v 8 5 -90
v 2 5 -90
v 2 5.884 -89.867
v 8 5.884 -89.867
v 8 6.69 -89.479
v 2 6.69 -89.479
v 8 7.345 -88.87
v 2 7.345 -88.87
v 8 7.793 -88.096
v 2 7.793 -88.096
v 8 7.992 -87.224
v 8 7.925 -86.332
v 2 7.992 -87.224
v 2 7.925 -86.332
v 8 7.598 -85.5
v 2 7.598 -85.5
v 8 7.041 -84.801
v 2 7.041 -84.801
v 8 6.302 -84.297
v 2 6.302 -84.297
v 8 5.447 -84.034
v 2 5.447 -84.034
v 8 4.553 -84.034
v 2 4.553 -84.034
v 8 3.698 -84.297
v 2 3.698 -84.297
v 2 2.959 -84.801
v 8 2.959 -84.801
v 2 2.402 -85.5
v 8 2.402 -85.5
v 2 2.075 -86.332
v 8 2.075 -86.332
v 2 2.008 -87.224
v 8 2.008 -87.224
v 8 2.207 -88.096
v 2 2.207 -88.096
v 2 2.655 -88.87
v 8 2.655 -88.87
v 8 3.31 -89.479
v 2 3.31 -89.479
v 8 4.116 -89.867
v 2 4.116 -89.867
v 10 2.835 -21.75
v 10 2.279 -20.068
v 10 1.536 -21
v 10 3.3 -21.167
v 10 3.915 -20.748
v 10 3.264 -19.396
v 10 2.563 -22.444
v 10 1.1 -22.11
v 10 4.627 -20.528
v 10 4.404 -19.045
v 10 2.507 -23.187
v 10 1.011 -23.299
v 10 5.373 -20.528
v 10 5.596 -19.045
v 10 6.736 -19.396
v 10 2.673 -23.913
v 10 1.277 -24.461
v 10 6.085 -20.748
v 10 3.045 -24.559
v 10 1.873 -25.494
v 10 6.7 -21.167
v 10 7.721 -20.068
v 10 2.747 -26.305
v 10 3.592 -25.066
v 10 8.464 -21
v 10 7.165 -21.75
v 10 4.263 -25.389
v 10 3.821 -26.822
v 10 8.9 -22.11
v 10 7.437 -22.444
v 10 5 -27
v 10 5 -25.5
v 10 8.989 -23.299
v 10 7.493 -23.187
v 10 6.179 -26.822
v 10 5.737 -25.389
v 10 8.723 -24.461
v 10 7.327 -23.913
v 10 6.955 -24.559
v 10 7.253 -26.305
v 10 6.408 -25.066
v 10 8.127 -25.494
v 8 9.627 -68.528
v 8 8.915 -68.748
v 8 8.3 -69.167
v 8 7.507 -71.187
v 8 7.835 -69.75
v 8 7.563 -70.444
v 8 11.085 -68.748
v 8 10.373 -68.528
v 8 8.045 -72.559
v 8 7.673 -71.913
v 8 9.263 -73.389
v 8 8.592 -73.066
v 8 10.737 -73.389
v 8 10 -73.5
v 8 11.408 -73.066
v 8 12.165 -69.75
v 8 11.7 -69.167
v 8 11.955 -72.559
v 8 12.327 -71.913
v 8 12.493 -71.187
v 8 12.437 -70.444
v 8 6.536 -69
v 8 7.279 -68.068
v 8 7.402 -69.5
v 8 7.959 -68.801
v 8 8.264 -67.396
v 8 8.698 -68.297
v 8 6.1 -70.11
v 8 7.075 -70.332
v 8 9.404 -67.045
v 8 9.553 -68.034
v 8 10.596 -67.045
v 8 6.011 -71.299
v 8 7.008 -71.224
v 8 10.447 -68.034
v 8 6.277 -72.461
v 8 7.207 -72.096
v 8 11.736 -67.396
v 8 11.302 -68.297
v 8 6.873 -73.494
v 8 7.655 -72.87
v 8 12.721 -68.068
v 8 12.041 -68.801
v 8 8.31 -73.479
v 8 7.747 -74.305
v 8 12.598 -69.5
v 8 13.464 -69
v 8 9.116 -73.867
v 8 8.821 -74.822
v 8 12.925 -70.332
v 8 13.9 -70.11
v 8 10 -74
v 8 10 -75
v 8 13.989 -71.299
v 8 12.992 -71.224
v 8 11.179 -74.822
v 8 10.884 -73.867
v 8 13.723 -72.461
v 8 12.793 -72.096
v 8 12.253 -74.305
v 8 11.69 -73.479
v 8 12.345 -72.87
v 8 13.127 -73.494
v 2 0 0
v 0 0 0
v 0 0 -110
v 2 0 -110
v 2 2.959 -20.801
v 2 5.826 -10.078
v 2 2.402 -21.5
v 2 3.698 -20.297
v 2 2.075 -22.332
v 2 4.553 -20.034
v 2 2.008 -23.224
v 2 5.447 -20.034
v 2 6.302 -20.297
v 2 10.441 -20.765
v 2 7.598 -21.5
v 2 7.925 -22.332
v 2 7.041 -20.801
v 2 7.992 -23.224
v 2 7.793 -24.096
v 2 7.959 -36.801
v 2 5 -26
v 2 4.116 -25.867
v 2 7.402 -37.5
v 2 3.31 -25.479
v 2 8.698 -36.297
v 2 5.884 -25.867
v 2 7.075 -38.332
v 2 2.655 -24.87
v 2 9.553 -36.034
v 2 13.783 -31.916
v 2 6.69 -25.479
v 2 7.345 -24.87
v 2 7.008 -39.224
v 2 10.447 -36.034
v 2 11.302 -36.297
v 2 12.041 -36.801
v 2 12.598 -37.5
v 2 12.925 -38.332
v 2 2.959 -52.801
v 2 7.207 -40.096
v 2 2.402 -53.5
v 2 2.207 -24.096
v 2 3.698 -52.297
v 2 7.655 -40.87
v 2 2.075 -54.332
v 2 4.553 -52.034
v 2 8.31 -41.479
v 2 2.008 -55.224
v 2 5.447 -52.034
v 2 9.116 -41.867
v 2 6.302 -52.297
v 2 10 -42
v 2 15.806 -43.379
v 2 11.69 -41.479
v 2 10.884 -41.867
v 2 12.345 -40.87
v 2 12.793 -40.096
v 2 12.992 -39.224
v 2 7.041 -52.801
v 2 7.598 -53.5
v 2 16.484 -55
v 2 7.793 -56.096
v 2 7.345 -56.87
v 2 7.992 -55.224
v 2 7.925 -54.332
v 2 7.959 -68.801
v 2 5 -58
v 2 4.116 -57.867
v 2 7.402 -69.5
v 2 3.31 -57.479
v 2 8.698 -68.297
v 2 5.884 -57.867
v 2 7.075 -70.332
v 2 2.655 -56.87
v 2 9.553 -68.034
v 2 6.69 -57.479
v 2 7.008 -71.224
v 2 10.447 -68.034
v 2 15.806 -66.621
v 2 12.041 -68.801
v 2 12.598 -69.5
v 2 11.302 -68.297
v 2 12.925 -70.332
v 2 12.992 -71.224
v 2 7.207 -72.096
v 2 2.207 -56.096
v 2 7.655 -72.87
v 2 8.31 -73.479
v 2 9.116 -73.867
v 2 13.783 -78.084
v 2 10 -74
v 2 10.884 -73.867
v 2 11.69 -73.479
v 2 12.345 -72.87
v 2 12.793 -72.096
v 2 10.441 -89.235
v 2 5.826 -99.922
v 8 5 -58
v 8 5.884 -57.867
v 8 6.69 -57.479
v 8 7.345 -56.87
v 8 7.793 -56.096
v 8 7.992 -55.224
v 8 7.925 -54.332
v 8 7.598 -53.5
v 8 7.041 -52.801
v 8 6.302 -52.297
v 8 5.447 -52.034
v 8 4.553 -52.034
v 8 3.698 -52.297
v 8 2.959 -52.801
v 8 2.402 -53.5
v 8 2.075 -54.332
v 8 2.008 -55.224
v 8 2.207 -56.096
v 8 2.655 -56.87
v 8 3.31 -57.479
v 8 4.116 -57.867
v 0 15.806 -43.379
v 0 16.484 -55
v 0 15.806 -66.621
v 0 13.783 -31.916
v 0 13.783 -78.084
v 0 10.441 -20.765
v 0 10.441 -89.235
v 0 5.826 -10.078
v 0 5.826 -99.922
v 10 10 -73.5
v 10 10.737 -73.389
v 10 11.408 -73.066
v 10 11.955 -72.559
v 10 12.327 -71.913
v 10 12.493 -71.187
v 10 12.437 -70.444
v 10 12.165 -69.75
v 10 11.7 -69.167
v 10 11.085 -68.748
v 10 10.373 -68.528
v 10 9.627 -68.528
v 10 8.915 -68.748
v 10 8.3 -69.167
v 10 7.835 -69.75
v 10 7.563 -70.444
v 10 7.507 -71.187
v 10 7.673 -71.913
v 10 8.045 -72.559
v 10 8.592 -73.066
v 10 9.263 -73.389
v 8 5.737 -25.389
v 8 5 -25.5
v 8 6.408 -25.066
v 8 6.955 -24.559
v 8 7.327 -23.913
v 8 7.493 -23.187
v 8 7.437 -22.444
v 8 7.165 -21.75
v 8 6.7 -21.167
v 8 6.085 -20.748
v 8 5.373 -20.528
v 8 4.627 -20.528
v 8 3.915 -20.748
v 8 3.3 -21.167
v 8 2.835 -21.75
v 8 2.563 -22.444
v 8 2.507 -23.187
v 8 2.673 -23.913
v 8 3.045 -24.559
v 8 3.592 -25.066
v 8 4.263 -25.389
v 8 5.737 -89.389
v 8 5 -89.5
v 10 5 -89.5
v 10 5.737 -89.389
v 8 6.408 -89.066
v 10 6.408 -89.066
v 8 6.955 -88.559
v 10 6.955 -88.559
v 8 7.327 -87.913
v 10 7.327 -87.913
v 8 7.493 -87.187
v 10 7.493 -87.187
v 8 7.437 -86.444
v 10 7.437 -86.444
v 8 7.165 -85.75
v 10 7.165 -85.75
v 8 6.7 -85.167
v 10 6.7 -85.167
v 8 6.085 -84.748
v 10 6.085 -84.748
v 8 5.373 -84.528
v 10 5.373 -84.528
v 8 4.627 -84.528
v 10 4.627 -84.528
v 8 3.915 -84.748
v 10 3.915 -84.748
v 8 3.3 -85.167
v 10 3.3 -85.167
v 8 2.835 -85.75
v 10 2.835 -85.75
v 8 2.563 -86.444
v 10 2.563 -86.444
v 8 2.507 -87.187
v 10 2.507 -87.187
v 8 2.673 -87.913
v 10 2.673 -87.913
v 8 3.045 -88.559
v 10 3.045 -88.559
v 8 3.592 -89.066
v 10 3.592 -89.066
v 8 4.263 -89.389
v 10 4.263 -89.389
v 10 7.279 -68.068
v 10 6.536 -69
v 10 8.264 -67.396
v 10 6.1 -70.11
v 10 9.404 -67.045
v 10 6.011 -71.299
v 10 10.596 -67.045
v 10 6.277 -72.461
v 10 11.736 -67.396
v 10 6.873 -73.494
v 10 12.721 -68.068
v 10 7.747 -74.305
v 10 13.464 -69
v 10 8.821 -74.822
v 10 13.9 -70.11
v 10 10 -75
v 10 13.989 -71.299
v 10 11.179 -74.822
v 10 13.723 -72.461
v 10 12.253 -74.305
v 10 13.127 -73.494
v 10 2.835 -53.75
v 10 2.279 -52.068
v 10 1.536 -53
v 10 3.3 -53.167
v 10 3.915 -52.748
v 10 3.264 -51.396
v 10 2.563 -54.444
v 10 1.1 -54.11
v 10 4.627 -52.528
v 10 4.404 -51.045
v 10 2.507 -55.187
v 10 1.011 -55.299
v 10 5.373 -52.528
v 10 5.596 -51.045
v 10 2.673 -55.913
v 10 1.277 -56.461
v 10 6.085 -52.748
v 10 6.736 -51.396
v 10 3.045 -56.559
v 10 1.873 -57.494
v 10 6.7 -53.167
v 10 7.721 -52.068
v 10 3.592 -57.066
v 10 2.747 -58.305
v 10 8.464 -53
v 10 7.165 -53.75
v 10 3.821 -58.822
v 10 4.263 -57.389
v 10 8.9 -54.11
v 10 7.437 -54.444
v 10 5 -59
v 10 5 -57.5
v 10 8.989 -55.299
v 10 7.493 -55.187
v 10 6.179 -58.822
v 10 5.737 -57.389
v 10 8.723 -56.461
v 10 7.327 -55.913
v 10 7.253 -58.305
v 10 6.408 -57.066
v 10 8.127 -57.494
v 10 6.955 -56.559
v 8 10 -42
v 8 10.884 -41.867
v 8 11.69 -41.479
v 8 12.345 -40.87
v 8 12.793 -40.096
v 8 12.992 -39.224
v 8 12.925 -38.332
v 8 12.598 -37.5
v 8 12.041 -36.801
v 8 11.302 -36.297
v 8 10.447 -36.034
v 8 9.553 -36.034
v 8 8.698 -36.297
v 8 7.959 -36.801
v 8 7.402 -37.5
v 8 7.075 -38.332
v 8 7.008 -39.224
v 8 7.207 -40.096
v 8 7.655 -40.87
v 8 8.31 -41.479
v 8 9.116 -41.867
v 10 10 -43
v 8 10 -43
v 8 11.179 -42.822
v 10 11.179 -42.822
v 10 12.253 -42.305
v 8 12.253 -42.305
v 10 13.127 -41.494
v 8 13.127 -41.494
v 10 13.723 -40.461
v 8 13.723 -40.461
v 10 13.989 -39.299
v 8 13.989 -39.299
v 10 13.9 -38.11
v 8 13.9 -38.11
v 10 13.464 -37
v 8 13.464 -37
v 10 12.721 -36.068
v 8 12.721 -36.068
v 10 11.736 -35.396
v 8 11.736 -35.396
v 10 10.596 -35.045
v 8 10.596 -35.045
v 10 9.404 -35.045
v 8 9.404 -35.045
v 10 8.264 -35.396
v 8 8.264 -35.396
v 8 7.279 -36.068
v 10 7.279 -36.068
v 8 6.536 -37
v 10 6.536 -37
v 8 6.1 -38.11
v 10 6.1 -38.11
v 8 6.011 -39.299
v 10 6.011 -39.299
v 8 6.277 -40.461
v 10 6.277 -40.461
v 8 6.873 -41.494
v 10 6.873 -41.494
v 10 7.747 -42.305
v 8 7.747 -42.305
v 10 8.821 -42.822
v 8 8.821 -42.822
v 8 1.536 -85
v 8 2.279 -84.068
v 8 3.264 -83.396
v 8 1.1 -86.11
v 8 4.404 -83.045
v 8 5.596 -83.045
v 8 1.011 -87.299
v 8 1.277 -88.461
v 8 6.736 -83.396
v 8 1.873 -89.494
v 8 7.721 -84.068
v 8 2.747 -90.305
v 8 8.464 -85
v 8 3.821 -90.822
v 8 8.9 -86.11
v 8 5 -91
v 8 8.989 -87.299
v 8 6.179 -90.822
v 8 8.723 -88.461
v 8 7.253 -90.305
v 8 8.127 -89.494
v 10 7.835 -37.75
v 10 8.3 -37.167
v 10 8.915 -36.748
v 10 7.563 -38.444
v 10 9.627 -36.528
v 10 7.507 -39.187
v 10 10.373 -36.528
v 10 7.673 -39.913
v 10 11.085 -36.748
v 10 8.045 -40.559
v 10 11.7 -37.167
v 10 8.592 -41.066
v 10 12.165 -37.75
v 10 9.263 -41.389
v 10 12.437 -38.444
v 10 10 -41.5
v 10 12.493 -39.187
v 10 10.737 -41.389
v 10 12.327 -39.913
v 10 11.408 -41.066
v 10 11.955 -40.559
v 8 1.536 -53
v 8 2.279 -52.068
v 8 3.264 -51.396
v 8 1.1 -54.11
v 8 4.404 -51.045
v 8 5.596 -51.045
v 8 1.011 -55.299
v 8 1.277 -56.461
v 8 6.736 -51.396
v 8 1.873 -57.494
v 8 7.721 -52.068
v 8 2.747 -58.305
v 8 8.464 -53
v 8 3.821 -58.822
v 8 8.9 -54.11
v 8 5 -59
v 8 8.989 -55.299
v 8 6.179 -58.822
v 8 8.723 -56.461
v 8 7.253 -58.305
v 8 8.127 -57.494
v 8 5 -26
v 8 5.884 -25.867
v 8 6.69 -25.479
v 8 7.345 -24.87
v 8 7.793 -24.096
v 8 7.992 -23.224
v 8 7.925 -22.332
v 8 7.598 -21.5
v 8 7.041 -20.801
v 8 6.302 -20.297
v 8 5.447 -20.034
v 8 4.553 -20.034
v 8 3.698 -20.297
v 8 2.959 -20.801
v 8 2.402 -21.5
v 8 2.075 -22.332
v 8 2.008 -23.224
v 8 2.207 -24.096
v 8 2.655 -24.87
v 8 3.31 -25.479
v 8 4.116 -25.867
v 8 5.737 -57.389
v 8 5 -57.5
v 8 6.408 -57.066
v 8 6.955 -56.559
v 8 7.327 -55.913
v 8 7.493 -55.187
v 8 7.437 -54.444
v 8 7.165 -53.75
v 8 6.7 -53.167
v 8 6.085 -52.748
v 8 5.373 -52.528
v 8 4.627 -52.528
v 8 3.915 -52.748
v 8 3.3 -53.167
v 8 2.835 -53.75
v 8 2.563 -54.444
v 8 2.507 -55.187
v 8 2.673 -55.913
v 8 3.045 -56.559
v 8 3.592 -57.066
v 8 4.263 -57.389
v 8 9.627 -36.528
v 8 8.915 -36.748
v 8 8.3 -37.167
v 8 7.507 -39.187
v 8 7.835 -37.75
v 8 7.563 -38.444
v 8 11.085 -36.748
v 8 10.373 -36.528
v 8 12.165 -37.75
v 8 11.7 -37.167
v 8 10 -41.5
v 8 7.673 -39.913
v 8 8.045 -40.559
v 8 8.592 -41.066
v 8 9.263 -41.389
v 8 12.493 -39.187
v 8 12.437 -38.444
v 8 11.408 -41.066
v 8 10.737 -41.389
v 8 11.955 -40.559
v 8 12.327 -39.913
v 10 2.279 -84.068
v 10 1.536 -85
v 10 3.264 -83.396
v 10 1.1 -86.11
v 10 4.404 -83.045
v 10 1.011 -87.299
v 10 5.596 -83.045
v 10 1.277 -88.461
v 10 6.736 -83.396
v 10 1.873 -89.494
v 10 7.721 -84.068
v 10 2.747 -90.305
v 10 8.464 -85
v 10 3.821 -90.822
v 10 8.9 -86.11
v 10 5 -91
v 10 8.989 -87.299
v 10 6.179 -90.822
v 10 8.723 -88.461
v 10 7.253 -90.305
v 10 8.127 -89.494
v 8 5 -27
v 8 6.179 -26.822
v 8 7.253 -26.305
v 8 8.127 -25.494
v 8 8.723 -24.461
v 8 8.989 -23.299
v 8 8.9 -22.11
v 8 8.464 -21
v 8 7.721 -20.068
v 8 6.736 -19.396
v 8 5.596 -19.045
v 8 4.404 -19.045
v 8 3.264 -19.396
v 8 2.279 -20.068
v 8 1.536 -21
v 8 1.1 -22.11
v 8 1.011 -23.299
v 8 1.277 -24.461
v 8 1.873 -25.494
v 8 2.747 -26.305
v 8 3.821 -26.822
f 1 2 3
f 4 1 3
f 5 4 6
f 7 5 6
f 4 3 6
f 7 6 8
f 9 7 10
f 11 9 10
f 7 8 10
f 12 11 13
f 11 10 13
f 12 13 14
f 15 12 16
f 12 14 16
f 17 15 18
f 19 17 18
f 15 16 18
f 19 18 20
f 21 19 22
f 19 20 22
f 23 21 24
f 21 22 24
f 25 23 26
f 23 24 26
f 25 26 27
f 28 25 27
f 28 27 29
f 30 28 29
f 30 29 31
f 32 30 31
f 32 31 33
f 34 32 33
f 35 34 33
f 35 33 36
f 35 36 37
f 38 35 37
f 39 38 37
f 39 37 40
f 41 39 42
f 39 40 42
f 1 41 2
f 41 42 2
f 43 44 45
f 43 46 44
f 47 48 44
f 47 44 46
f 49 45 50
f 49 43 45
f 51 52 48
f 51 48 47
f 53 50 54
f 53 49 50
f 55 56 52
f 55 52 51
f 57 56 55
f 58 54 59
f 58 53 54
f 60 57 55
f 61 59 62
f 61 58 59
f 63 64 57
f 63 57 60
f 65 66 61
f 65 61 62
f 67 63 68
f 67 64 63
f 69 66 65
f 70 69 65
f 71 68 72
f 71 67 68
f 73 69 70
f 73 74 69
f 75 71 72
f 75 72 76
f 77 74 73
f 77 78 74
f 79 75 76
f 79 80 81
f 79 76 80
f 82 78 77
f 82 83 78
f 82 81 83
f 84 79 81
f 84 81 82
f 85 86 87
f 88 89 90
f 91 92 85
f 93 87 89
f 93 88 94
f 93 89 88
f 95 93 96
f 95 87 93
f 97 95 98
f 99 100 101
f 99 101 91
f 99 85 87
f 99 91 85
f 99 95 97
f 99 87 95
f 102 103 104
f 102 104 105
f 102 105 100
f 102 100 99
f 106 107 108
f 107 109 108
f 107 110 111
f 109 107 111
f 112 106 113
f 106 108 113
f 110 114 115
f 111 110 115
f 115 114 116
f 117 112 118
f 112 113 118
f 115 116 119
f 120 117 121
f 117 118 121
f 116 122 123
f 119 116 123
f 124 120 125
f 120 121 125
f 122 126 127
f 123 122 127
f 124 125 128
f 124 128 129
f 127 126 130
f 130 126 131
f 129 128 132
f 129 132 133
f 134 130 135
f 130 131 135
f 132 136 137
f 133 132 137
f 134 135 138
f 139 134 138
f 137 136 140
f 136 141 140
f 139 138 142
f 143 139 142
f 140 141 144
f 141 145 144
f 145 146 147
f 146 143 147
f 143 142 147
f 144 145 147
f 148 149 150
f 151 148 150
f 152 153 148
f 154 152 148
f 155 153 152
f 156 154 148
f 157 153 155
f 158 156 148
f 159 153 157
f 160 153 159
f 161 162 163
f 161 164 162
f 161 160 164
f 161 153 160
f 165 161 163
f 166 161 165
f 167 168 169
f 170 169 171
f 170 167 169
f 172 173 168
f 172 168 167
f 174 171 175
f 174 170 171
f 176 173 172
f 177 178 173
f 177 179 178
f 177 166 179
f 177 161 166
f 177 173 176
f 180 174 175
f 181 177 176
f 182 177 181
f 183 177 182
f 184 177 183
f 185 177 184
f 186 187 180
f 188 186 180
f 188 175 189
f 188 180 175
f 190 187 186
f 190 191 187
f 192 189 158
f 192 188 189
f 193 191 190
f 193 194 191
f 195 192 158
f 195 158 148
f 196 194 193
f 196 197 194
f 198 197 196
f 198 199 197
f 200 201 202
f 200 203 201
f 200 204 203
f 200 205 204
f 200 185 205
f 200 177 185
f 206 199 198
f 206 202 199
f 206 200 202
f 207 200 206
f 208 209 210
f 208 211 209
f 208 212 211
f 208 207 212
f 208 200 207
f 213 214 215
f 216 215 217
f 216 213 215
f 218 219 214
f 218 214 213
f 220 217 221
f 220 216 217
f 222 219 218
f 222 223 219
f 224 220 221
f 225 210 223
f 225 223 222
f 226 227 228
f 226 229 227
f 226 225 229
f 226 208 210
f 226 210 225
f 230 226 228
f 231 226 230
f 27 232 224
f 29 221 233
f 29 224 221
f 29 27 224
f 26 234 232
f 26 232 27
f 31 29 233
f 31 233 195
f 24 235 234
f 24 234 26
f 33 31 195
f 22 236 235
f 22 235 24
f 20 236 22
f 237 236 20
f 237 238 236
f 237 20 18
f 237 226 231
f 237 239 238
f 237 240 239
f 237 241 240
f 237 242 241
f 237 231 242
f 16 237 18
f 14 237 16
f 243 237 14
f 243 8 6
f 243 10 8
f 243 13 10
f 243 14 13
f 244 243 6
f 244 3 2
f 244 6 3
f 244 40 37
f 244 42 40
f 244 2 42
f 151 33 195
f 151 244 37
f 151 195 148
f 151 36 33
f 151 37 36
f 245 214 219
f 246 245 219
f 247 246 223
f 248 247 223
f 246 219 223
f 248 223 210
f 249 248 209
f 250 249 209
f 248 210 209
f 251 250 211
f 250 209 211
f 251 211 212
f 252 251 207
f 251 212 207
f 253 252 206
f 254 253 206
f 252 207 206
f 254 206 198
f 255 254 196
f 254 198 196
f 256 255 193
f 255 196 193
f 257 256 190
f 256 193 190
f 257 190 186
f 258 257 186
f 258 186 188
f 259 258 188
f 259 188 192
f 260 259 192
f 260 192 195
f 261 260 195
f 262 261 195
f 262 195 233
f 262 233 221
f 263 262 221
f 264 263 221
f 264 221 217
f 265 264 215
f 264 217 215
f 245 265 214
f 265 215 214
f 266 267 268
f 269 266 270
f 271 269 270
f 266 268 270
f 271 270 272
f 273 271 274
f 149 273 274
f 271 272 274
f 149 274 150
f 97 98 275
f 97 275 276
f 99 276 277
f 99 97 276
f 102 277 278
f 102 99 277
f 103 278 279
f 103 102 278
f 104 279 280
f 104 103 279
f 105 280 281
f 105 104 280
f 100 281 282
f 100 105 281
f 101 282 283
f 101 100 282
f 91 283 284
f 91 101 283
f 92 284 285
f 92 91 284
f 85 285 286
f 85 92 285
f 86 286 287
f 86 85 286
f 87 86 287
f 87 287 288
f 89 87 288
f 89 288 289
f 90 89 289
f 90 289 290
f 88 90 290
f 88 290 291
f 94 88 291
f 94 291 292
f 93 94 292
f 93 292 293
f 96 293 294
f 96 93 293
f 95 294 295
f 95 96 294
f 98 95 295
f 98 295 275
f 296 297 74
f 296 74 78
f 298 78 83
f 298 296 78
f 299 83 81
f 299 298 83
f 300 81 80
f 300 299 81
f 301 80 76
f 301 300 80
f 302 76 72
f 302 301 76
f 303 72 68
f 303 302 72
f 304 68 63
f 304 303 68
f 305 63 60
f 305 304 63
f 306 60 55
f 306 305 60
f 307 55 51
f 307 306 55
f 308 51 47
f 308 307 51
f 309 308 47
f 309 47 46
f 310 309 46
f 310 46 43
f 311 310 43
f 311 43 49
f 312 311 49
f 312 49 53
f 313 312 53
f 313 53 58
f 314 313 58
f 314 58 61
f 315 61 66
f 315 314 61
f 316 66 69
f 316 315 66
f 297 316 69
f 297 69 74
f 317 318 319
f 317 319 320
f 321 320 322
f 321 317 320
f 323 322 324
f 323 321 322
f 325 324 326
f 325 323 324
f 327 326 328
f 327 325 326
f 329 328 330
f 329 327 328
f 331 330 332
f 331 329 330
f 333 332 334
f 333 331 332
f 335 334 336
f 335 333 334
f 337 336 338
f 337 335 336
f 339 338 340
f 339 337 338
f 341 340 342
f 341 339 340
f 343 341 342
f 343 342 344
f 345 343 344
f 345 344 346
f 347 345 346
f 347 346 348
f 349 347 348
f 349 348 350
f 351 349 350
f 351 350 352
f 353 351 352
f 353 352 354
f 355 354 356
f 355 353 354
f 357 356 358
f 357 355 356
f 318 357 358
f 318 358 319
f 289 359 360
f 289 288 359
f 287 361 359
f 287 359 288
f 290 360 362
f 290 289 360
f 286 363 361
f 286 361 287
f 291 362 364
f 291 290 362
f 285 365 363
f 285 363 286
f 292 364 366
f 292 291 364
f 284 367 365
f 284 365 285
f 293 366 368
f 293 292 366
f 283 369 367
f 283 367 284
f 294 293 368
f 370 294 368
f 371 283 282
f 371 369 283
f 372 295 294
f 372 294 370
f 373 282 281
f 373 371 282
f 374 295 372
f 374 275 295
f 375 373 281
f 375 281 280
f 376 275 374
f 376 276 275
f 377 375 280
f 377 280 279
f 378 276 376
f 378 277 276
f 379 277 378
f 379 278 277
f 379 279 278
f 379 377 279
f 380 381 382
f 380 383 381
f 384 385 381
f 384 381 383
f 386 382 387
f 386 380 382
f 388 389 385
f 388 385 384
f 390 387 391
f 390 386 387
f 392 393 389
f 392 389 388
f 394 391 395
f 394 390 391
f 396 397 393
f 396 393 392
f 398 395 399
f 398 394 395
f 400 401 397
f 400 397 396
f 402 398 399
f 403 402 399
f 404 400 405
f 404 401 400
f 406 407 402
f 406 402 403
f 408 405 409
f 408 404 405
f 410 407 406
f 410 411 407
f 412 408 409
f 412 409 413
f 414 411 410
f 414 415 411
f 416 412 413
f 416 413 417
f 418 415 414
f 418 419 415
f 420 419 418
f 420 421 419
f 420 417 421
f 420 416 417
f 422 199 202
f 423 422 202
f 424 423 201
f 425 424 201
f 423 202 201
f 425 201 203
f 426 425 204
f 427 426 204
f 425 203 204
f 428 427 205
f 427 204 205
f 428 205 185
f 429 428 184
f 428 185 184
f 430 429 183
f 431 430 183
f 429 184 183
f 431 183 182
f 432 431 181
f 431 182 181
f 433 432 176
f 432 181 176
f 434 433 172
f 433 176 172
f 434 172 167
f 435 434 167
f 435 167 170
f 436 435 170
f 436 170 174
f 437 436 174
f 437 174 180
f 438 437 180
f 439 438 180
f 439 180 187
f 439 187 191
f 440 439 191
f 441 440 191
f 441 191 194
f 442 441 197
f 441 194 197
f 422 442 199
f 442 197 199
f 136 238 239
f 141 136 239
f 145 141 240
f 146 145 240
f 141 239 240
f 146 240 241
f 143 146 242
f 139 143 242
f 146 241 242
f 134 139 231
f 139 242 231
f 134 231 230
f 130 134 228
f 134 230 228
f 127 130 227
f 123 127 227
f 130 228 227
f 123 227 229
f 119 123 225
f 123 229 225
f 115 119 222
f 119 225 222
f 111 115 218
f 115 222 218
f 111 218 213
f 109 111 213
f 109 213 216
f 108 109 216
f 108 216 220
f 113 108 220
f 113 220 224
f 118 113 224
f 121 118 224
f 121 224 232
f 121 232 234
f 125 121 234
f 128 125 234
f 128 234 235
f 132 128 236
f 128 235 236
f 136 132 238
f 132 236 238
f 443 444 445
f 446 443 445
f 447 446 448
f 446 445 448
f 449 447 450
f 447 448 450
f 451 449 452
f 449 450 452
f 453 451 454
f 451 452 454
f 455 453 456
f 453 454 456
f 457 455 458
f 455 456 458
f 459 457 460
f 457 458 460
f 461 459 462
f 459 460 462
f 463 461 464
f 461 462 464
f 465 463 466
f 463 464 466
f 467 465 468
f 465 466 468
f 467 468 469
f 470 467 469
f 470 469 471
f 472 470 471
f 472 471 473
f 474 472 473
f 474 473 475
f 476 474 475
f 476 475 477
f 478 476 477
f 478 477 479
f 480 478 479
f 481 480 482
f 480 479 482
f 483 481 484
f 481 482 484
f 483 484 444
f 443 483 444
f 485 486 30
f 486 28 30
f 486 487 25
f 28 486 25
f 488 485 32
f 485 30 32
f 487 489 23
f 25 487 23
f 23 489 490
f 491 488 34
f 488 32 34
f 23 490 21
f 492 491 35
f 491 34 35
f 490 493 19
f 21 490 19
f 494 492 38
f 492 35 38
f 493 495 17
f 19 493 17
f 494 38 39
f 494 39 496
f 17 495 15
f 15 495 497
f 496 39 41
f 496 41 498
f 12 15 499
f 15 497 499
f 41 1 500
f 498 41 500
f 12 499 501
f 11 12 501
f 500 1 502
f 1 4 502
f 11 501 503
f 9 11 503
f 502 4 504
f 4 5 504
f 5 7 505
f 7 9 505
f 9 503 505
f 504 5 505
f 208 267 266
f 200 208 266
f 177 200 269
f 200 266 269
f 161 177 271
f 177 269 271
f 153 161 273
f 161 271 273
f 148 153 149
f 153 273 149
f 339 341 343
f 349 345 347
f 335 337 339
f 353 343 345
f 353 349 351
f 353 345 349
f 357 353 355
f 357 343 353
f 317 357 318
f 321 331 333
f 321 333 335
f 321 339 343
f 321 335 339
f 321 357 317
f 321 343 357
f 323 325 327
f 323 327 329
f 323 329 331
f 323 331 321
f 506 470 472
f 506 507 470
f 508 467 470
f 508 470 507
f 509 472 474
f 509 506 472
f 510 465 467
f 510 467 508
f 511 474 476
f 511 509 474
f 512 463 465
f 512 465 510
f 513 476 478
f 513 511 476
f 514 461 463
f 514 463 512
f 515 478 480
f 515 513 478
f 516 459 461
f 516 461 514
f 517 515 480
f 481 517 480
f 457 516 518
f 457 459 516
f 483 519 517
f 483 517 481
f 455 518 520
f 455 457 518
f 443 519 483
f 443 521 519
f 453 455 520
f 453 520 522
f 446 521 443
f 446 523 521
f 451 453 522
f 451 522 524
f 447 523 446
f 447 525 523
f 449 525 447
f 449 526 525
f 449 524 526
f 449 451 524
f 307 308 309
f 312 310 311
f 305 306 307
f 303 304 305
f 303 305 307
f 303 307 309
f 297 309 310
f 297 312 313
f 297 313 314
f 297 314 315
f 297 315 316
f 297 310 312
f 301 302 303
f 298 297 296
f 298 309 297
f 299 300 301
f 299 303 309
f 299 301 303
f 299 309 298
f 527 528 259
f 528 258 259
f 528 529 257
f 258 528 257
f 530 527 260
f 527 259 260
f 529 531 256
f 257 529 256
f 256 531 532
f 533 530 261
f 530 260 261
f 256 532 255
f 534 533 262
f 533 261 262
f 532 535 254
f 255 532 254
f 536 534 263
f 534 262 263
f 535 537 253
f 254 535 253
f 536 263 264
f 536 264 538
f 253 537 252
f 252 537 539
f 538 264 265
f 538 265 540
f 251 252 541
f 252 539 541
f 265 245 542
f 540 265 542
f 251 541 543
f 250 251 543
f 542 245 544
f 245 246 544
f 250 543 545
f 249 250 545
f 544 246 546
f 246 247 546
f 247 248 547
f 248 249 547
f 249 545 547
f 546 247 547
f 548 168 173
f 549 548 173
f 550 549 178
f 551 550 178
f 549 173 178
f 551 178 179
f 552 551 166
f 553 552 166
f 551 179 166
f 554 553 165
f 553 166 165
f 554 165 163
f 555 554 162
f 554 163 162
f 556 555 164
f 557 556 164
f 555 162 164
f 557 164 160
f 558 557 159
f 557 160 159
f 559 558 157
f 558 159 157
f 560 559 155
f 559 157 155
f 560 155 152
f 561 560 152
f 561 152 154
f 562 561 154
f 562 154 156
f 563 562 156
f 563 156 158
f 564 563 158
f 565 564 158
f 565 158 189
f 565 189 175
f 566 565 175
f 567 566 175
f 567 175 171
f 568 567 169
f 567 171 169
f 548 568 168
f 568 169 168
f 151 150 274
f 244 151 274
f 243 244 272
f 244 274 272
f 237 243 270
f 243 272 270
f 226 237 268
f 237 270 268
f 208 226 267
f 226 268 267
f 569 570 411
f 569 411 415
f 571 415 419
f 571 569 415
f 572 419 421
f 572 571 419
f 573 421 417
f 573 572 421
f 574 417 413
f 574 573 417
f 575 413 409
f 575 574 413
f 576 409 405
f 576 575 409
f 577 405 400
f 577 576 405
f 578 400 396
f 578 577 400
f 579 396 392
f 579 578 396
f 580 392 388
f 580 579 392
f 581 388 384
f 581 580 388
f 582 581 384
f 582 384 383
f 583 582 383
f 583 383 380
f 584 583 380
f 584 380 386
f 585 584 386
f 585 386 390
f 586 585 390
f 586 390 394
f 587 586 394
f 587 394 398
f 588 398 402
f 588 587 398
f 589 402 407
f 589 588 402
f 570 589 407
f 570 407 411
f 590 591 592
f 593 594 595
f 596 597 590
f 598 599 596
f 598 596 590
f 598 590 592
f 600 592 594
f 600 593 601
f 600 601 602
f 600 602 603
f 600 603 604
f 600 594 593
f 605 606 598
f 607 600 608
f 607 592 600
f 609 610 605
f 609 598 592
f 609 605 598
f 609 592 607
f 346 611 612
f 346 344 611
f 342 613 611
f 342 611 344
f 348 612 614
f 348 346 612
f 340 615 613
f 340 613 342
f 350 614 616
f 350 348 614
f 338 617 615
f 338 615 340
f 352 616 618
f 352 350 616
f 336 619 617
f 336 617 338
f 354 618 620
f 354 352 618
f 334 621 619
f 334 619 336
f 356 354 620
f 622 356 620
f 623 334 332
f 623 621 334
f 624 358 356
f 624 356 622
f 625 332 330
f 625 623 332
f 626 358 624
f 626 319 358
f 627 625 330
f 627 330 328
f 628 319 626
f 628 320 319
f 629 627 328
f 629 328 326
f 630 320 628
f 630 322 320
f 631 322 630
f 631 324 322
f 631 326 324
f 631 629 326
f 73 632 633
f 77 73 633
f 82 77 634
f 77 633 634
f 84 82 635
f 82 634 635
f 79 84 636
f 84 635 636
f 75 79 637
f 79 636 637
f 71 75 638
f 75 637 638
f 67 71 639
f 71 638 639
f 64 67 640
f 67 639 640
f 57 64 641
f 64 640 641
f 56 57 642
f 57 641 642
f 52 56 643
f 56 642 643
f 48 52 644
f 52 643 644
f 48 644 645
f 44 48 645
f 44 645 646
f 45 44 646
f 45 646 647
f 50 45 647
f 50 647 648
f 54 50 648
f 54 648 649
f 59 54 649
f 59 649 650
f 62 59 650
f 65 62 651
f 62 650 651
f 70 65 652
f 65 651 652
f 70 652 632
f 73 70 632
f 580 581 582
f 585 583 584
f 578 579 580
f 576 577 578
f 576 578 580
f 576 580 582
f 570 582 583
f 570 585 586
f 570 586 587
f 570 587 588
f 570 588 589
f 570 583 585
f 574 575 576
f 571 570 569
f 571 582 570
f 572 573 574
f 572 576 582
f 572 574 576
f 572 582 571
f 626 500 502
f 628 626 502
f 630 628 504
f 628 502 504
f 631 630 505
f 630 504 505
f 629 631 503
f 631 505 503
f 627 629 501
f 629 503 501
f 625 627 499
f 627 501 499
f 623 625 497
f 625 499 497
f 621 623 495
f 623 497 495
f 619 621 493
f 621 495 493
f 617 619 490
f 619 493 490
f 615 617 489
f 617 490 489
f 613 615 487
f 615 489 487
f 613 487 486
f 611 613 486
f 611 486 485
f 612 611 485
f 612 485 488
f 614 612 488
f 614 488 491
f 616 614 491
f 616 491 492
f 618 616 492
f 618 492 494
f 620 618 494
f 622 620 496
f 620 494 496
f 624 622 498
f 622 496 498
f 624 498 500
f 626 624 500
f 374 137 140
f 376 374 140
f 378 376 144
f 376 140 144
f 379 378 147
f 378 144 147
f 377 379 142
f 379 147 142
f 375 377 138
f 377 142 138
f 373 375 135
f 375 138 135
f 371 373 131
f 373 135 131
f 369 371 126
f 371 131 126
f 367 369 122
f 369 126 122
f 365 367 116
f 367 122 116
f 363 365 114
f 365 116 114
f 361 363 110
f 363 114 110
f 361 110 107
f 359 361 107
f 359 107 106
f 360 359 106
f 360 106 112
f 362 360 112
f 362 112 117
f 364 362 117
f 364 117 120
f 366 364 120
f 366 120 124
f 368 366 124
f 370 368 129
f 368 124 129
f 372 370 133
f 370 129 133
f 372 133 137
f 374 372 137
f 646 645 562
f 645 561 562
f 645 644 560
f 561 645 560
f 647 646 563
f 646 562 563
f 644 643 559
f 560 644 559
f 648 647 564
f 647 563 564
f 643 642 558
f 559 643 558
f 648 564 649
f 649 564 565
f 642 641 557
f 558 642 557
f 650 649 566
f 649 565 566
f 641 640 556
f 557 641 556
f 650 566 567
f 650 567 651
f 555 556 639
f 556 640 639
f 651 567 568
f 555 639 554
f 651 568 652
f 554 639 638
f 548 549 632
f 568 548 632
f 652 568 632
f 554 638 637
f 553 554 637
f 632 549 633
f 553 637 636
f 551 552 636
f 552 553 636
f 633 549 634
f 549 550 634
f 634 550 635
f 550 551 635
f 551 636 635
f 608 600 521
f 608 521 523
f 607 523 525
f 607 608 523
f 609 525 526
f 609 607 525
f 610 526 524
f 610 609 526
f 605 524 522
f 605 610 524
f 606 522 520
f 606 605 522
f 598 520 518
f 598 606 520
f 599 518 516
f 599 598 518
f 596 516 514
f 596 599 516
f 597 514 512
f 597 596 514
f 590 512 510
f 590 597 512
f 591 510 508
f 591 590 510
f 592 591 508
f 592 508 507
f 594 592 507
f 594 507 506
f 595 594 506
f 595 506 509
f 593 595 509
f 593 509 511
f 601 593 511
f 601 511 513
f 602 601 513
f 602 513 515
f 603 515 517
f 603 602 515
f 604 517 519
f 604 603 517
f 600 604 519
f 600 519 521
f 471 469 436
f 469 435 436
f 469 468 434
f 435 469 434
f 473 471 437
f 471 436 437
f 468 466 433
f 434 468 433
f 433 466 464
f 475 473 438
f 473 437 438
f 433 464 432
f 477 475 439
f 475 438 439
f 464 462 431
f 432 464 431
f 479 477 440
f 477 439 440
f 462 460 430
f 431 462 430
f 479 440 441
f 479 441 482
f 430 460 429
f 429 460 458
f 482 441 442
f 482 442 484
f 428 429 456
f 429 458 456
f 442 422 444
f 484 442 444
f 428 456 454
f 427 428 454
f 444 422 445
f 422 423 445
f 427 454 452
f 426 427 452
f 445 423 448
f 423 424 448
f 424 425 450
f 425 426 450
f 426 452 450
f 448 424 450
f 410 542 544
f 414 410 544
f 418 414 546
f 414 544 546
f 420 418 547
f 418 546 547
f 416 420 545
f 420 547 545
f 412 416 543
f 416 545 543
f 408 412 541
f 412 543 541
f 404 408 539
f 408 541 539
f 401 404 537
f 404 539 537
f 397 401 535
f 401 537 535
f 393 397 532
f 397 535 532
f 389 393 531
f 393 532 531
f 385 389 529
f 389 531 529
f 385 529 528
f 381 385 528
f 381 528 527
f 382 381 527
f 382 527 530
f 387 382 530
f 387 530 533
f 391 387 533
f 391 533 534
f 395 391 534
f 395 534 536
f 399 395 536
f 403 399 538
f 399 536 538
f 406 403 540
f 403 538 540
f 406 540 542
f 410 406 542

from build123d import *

# Parameters (mm, degrees)
EXTRUDE_1_DEPTH = 2
SKETCH_2_R      = 3
EXTRUDE_2_DEPTH = 6
SKETCH_3_R      = 4
SKETCH_3_R_2    = 2.5
EXTRUDE_3_DEPTH = 2


with BuildPart() as part:
    # ｽｹｯﾁ1 → 押し出し1 (new body)
    with BuildSketch(Plane(origin=(0, 0, 0), x_dir=(0, 0, -1), z_dir=(1, 0, 0))):
        with BuildLine():
            ThreePointArc((55, 16.483534558), (26.291521673, 12.27405221), (0, 0))
            Line((0, 0), (55, 0))
            Line((55, 0), (55, 16.483534558))
        make_face()
        with BuildLine():
            Line((55, 16.483534558), (55, 0))
            Line((55, 0), (110, 0))
            ThreePointArc((110, 0), (83.708478327, 12.27405221), (55, 16.483534558))
        make_face()
    extrude(amount=EXTRUDE_1_DEPTH)

    # ｽｹｯﾁ2 → 押し出し2 (add)
    with BuildSketch(Plane(origin=(2, 0, 0), x_dir=(0, 0, -1), z_dir=(1, 0, 0))):
        with Locations((23, 5)):
            Circle(SKETCH_2_R)
        with Locations((39, 10)):
            Circle(SKETCH_2_R)
        with Locations((55, 5)):
            Circle(SKETCH_2_R)
        with Locations((71, 10)):
            Circle(SKETCH_2_R)
        with Locations((87, 5)):
            Circle(SKETCH_2_R)
    extrude(amount=EXTRUDE_2_DEPTH)

    # ｽｹｯﾁ3 → 押し出し3 (add)
    # profile 1 of 5: a face of its own
    with BuildSketch(Plane(origin=(8, 0, 0), x_dir=(0, 0, -1), z_dir=(1, 0, 0))):
        with Locations((23, 5)):
            Circle(SKETCH_3_R)
        with Locations((23, 5)):
            Circle(SKETCH_3_R_2, mode=Mode.SUBTRACT)
    # profile 2 of 5: a face of its own
    with BuildSketch(Plane(origin=(8, 0, 0), x_dir=(0, 0, -1), z_dir=(1, 0, 0))):
        with Locations((39, 10)):
            Circle(SKETCH_3_R)
        with Locations((39, 10)):
            Circle(SKETCH_3_R_2, mode=Mode.SUBTRACT)
    # profile 3 of 5: a face of its own
    with BuildSketch(Plane(origin=(8, 0, 0), x_dir=(0, 0, -1), z_dir=(1, 0, 0))):
        with Locations((55, 5)):
            Circle(SKETCH_3_R)
        with Locations((55, 5)):
            Circle(SKETCH_3_R_2, mode=Mode.SUBTRACT)
    # profile 4 of 5: a face of its own
    with BuildSketch(Plane(origin=(8, 0, 0), x_dir=(0, 0, -1), z_dir=(1, 0, 0))):
        with Locations((71, 10)):
            Circle(SKETCH_3_R)
        with Locations((71, 10)):
            Circle(SKETCH_3_R_2, mode=Mode.SUBTRACT)
    # profile 5 of 5: a face of its own
    with BuildSketch(Plane(origin=(8, 0, 0), x_dir=(0, 0, -1), z_dir=(1, 0, 0))):
        with Locations((87, 5)):
            Circle(SKETCH_3_R)
        with Locations((87, 5)):
            Circle(SKETCH_3_R_2, mode=Mode.SUBTRACT)
    extrude(amount=EXTRUDE_3_DEPTH)


solid = part.part
